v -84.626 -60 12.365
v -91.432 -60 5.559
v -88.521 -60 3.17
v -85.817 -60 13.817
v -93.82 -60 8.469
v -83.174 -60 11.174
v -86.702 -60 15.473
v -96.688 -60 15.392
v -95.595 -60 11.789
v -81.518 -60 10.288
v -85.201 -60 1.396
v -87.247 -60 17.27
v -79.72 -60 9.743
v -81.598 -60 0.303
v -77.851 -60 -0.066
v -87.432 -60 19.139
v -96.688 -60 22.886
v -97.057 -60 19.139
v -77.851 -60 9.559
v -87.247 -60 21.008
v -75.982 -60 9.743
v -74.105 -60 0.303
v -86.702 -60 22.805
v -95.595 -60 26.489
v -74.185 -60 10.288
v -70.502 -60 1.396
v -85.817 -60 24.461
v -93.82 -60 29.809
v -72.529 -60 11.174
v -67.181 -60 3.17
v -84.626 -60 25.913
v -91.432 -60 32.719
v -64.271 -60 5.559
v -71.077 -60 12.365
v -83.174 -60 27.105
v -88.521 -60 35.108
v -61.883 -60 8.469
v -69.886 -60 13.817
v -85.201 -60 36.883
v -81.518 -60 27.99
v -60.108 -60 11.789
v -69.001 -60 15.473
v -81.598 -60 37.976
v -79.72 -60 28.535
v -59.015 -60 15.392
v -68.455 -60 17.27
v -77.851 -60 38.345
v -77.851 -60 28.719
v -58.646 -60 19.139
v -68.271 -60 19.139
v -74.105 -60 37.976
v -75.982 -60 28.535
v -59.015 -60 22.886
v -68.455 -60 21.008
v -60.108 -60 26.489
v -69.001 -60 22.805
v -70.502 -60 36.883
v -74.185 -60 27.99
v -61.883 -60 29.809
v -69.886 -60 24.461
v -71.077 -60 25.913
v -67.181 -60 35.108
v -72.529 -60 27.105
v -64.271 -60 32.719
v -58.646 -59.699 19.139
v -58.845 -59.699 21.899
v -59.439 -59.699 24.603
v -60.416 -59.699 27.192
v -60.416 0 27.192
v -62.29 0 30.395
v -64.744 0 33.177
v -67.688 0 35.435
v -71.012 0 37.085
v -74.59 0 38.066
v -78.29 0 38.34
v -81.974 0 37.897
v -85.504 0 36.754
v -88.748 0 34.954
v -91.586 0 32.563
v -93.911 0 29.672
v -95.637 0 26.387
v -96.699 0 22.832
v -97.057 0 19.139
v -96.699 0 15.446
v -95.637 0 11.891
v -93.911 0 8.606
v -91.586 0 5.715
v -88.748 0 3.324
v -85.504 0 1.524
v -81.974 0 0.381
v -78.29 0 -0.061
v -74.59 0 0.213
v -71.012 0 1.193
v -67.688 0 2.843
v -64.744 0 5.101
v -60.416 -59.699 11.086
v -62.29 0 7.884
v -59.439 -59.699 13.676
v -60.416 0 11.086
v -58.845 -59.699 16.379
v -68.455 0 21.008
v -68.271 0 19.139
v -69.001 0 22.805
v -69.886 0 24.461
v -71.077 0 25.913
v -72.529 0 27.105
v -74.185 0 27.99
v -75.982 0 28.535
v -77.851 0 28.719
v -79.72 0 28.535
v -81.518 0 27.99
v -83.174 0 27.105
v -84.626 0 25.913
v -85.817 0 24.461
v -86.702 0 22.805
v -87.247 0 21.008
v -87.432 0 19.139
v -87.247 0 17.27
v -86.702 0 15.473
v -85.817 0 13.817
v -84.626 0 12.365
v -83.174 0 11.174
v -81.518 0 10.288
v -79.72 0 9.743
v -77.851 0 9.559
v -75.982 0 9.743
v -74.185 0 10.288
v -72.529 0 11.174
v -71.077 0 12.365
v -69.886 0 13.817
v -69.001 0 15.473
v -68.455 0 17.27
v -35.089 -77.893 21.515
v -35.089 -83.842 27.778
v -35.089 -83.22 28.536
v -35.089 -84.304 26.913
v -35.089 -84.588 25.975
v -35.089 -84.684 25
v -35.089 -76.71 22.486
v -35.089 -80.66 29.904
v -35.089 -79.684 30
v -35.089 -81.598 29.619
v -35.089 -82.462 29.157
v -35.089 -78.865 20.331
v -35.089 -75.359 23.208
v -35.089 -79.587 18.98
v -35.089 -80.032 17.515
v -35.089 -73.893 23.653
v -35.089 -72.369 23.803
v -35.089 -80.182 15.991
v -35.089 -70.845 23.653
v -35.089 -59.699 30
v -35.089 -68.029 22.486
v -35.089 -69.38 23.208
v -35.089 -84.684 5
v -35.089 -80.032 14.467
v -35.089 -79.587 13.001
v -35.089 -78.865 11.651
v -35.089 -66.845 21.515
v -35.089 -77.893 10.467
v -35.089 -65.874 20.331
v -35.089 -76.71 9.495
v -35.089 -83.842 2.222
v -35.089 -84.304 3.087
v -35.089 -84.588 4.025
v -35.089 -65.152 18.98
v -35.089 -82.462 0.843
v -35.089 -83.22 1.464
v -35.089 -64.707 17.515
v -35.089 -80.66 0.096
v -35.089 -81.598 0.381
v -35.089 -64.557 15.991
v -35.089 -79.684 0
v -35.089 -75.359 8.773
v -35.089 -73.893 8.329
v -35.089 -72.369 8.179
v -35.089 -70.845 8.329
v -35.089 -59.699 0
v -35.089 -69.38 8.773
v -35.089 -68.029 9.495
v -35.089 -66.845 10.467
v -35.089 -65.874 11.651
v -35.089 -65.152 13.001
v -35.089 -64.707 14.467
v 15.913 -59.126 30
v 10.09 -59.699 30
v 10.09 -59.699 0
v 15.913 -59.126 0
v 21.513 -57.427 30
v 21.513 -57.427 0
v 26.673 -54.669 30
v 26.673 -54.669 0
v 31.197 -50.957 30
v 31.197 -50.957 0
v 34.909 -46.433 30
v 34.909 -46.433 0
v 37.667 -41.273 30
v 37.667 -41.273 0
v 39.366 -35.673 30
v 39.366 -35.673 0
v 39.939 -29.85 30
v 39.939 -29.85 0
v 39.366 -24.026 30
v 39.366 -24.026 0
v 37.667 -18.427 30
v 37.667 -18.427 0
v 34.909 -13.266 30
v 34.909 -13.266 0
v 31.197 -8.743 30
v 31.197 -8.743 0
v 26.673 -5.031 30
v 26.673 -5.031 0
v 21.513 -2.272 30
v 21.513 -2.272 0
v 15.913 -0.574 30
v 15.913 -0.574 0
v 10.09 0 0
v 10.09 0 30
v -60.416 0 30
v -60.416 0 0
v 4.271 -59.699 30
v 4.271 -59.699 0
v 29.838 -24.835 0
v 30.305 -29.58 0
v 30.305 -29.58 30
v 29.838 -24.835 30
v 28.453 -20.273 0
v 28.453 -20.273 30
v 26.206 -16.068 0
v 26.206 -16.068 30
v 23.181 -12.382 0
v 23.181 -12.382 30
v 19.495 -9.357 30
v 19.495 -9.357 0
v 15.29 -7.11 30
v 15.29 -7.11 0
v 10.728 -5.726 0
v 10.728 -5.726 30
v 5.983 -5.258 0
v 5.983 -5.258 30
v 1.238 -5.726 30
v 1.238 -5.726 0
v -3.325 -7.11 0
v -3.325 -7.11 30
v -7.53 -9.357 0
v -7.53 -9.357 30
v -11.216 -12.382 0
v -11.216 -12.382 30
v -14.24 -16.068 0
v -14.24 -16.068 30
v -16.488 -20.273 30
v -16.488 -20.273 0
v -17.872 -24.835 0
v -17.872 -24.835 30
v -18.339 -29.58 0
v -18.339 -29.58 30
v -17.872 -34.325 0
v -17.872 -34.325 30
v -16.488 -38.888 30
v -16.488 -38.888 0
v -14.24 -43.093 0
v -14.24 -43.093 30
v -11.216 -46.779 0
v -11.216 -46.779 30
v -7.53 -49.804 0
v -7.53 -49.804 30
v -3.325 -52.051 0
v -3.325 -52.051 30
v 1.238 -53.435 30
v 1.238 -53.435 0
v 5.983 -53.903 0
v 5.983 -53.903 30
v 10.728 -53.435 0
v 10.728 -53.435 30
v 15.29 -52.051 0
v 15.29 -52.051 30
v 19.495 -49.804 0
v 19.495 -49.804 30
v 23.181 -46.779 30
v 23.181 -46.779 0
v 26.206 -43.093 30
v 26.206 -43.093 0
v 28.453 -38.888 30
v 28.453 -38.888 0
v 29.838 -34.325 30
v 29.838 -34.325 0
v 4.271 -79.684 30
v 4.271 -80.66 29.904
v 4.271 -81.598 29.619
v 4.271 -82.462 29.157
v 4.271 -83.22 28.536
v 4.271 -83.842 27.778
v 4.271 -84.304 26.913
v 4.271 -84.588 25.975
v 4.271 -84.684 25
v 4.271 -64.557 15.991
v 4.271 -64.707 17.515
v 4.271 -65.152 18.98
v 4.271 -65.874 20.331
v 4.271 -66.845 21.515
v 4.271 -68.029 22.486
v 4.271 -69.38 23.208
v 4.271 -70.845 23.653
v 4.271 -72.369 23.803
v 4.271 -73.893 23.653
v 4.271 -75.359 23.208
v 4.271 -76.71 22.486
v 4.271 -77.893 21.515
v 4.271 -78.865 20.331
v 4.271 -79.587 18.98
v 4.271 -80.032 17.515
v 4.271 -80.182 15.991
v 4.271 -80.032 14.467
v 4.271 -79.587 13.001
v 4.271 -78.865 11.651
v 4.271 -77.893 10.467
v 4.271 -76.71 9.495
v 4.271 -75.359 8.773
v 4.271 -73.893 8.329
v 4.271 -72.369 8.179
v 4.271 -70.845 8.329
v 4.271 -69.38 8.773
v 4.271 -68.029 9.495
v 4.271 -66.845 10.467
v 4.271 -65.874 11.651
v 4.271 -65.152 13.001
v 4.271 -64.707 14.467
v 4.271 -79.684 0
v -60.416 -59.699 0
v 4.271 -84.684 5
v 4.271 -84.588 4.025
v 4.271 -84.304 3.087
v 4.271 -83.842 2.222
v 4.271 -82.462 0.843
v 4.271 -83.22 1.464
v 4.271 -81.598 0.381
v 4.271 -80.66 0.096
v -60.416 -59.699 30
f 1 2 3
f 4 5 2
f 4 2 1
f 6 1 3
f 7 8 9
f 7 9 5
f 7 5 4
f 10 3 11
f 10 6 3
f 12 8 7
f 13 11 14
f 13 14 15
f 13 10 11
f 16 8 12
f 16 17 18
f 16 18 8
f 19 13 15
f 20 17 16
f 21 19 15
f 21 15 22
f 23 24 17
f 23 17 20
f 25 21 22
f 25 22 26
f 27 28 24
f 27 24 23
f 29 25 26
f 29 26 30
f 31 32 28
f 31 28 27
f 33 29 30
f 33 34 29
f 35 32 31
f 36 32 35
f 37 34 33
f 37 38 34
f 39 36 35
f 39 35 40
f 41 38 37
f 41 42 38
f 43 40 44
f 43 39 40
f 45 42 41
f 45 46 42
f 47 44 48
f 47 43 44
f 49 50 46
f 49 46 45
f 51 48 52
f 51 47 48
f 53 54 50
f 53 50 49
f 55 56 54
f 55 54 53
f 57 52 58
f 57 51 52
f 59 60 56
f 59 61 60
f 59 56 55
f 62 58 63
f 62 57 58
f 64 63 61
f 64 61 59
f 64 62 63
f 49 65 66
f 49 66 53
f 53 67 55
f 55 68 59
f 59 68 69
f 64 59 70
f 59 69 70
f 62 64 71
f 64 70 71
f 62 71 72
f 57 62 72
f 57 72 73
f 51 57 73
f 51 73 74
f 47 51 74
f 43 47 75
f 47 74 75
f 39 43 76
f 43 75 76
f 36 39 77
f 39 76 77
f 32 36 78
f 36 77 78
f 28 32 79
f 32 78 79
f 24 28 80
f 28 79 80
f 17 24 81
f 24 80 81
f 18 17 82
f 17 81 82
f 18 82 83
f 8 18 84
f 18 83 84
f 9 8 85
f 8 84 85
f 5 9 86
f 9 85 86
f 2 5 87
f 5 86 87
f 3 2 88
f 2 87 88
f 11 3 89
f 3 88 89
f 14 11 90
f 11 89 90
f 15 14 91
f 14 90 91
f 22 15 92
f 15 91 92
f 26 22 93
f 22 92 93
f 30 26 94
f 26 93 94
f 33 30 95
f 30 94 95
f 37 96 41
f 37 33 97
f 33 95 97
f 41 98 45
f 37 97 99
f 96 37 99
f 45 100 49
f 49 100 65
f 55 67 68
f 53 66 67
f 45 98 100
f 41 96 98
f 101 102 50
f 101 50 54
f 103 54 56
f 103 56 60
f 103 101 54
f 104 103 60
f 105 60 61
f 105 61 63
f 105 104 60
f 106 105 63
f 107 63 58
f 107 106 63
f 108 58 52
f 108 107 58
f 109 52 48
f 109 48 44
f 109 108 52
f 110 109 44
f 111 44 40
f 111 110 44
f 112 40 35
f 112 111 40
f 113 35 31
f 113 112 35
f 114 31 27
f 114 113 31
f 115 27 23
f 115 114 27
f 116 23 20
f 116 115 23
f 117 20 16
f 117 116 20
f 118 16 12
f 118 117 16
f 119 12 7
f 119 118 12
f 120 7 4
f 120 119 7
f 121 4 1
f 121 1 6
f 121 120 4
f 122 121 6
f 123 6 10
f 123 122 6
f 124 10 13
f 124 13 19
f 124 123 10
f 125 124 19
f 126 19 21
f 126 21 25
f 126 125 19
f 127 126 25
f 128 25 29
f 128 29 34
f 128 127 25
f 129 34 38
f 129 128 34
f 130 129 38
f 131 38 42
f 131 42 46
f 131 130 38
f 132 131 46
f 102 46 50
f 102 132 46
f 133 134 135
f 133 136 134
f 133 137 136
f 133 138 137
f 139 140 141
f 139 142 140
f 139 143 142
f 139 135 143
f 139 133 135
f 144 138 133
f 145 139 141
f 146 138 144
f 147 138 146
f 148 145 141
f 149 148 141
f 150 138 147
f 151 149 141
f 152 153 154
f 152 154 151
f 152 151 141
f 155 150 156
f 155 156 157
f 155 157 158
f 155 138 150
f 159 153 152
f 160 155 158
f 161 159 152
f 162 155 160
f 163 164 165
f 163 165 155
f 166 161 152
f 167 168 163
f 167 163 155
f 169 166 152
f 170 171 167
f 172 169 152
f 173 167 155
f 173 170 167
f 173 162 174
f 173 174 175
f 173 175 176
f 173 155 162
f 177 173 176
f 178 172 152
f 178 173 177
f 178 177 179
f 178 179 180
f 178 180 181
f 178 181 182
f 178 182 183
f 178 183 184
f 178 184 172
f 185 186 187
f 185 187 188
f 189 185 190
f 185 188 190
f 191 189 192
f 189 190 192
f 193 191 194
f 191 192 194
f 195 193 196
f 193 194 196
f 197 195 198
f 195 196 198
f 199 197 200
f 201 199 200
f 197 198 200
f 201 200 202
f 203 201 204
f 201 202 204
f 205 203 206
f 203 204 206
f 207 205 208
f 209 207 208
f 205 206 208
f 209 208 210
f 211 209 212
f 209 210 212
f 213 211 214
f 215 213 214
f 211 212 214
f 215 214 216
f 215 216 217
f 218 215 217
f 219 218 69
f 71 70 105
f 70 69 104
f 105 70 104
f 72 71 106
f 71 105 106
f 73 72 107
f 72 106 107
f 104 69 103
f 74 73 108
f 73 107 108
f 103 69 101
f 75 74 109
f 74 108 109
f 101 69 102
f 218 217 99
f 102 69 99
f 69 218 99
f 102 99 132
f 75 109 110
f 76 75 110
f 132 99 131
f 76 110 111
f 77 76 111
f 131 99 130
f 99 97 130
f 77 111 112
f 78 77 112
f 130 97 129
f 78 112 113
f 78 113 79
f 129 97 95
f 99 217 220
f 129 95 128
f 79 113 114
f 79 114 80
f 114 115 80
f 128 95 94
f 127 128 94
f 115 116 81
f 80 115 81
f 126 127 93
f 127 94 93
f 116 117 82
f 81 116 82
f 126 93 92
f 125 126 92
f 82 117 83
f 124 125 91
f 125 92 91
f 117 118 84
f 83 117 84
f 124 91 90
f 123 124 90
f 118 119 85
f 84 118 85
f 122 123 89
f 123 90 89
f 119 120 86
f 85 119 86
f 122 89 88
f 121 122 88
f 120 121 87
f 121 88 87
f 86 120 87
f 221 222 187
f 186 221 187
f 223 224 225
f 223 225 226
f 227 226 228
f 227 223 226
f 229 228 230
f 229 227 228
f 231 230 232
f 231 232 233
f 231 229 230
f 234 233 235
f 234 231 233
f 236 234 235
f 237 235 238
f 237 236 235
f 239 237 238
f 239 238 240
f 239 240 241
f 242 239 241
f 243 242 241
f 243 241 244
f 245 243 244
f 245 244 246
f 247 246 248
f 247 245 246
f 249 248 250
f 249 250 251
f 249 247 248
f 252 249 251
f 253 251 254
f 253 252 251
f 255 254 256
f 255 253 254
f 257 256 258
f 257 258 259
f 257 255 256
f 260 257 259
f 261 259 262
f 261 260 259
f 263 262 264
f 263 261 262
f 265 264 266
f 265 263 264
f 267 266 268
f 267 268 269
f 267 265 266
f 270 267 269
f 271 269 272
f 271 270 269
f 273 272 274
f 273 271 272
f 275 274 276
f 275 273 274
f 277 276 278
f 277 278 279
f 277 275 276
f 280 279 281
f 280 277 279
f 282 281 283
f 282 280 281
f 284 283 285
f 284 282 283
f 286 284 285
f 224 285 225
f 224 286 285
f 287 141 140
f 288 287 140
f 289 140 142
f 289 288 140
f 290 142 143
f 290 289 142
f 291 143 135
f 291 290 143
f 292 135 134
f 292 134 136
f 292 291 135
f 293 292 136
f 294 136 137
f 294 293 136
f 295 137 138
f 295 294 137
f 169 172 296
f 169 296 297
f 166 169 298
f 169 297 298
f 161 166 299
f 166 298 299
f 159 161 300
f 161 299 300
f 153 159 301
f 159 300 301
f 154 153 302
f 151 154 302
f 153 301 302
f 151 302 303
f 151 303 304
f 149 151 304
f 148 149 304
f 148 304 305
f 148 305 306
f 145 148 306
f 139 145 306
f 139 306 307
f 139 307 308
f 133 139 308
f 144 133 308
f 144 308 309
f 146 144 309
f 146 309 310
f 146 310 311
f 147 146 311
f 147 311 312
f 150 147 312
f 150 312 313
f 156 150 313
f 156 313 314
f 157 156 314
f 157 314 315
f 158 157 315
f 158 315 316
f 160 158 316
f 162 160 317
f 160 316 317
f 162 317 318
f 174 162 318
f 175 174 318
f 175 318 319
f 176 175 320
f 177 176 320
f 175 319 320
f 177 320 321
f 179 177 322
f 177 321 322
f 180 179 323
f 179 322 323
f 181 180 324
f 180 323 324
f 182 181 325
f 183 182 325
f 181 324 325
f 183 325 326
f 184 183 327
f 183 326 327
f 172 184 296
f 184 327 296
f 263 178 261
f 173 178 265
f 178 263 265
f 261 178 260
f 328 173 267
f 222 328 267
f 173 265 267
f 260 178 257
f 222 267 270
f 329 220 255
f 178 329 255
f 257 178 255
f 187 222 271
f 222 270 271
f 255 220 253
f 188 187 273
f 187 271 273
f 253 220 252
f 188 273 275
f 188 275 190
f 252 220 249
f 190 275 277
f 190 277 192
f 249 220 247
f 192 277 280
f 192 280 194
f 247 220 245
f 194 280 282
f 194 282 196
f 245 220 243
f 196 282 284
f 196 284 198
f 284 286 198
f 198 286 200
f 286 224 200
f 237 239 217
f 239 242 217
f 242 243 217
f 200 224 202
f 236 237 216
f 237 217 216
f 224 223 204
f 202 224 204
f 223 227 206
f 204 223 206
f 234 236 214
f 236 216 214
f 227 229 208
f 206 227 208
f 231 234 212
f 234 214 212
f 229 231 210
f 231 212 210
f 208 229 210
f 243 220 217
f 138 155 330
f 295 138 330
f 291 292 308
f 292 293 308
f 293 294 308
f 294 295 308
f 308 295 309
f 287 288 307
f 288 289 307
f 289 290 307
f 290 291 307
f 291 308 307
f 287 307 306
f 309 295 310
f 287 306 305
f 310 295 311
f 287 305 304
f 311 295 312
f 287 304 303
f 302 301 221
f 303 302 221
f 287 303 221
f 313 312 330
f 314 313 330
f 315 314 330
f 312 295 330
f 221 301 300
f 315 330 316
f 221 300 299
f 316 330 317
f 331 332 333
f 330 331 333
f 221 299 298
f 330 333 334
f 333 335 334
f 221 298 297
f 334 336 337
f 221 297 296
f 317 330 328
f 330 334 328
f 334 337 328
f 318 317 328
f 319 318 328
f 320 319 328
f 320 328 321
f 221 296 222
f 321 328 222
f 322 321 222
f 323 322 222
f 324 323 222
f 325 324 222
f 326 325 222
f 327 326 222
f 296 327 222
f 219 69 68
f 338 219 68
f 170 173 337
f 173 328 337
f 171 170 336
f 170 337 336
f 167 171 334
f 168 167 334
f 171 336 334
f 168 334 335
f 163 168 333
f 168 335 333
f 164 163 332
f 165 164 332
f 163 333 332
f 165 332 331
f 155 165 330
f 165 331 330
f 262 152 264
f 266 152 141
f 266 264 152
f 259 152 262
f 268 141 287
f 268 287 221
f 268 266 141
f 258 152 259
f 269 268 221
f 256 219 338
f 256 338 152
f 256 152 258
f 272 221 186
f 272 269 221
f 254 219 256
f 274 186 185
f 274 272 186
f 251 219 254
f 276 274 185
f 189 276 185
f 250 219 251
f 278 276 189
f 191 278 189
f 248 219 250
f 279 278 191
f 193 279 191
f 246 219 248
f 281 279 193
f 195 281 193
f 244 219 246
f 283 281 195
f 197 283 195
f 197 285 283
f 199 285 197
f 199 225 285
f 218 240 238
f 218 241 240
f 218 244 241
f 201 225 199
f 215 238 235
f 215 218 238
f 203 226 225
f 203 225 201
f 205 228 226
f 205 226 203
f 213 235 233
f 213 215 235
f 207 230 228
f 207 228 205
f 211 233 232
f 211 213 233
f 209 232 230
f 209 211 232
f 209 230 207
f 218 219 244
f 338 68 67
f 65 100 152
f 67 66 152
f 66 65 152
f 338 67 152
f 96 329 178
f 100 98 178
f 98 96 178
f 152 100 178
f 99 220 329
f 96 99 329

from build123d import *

# Parameters (mm, degrees)
F0_R     = 19.20551
F0_R_2   = 9.580083
F1_DEPTH = 60
F2_R     = 24.322186
F2_W     = 39.359974
F2_H     = 24.98503
F3_DEPTH = 30
F4_R     = 5
F5_R     = 7.812244
F6_DEPTH = 45


with BuildPart() as f1:
    # F0 (on Front) → F1 (new body)
    with BuildSketch(Plane.XZ):
        with Locations((-77.851459, 19.139083)):
            Circle(F0_R)
        with Locations((-77.851459, 19.139083)):
            Circle(F0_R_2, mode=Mode.SUBTRACT)
    extrude(amount=F1_DEPTH)

    # F2 (on Top) → F3 (join)
    with BuildSketch(Plane.XY):
        with BuildLine():
            Line((10.089813, 0), (-60.415883, 0))
            Line((-60.415883, 0), (-60.415883, -59.699342))
            Line((-60.415883, -59.699342), (-35.088591, -59.699342))
            Line((-35.088591, -59.699342), (4.271383, -59.699342))
            Line((4.271383, -59.699342), (10.089813, -59.699342))
            ThreePointArc((10.089813, -59.699342), (39.939484, -29.849671), (10.089813, 0))
        make_face()
        with Locations((5.982686, -29.580405)):
            Circle(F2_R, mode=Mode.SUBTRACT)
        with Locations((-15.408604, -72.191857)):
            Rectangle(F2_W, F2_H)
    extrude(amount=F3_DEPTH)

    # F4
    f4_edges = [f1.edges().sort_by_distance(p)[0] for p in [
        (-15.408604, -84.684372, 30),
        (-15.408604, -84.684372, 0),
    ]]
    fillet(f4_edges, radius=F4_R)

    # F5 (on face) → F6 (cut)
    with BuildSketch(Plane.YZ.offset(4.271383)):
        with Locations((-72.369397, 15.990797)):
            Circle(F5_R)
    extrude(amount=-F6_DEPTH, mode=Mode.SUBTRACT)


solid = f1.part
